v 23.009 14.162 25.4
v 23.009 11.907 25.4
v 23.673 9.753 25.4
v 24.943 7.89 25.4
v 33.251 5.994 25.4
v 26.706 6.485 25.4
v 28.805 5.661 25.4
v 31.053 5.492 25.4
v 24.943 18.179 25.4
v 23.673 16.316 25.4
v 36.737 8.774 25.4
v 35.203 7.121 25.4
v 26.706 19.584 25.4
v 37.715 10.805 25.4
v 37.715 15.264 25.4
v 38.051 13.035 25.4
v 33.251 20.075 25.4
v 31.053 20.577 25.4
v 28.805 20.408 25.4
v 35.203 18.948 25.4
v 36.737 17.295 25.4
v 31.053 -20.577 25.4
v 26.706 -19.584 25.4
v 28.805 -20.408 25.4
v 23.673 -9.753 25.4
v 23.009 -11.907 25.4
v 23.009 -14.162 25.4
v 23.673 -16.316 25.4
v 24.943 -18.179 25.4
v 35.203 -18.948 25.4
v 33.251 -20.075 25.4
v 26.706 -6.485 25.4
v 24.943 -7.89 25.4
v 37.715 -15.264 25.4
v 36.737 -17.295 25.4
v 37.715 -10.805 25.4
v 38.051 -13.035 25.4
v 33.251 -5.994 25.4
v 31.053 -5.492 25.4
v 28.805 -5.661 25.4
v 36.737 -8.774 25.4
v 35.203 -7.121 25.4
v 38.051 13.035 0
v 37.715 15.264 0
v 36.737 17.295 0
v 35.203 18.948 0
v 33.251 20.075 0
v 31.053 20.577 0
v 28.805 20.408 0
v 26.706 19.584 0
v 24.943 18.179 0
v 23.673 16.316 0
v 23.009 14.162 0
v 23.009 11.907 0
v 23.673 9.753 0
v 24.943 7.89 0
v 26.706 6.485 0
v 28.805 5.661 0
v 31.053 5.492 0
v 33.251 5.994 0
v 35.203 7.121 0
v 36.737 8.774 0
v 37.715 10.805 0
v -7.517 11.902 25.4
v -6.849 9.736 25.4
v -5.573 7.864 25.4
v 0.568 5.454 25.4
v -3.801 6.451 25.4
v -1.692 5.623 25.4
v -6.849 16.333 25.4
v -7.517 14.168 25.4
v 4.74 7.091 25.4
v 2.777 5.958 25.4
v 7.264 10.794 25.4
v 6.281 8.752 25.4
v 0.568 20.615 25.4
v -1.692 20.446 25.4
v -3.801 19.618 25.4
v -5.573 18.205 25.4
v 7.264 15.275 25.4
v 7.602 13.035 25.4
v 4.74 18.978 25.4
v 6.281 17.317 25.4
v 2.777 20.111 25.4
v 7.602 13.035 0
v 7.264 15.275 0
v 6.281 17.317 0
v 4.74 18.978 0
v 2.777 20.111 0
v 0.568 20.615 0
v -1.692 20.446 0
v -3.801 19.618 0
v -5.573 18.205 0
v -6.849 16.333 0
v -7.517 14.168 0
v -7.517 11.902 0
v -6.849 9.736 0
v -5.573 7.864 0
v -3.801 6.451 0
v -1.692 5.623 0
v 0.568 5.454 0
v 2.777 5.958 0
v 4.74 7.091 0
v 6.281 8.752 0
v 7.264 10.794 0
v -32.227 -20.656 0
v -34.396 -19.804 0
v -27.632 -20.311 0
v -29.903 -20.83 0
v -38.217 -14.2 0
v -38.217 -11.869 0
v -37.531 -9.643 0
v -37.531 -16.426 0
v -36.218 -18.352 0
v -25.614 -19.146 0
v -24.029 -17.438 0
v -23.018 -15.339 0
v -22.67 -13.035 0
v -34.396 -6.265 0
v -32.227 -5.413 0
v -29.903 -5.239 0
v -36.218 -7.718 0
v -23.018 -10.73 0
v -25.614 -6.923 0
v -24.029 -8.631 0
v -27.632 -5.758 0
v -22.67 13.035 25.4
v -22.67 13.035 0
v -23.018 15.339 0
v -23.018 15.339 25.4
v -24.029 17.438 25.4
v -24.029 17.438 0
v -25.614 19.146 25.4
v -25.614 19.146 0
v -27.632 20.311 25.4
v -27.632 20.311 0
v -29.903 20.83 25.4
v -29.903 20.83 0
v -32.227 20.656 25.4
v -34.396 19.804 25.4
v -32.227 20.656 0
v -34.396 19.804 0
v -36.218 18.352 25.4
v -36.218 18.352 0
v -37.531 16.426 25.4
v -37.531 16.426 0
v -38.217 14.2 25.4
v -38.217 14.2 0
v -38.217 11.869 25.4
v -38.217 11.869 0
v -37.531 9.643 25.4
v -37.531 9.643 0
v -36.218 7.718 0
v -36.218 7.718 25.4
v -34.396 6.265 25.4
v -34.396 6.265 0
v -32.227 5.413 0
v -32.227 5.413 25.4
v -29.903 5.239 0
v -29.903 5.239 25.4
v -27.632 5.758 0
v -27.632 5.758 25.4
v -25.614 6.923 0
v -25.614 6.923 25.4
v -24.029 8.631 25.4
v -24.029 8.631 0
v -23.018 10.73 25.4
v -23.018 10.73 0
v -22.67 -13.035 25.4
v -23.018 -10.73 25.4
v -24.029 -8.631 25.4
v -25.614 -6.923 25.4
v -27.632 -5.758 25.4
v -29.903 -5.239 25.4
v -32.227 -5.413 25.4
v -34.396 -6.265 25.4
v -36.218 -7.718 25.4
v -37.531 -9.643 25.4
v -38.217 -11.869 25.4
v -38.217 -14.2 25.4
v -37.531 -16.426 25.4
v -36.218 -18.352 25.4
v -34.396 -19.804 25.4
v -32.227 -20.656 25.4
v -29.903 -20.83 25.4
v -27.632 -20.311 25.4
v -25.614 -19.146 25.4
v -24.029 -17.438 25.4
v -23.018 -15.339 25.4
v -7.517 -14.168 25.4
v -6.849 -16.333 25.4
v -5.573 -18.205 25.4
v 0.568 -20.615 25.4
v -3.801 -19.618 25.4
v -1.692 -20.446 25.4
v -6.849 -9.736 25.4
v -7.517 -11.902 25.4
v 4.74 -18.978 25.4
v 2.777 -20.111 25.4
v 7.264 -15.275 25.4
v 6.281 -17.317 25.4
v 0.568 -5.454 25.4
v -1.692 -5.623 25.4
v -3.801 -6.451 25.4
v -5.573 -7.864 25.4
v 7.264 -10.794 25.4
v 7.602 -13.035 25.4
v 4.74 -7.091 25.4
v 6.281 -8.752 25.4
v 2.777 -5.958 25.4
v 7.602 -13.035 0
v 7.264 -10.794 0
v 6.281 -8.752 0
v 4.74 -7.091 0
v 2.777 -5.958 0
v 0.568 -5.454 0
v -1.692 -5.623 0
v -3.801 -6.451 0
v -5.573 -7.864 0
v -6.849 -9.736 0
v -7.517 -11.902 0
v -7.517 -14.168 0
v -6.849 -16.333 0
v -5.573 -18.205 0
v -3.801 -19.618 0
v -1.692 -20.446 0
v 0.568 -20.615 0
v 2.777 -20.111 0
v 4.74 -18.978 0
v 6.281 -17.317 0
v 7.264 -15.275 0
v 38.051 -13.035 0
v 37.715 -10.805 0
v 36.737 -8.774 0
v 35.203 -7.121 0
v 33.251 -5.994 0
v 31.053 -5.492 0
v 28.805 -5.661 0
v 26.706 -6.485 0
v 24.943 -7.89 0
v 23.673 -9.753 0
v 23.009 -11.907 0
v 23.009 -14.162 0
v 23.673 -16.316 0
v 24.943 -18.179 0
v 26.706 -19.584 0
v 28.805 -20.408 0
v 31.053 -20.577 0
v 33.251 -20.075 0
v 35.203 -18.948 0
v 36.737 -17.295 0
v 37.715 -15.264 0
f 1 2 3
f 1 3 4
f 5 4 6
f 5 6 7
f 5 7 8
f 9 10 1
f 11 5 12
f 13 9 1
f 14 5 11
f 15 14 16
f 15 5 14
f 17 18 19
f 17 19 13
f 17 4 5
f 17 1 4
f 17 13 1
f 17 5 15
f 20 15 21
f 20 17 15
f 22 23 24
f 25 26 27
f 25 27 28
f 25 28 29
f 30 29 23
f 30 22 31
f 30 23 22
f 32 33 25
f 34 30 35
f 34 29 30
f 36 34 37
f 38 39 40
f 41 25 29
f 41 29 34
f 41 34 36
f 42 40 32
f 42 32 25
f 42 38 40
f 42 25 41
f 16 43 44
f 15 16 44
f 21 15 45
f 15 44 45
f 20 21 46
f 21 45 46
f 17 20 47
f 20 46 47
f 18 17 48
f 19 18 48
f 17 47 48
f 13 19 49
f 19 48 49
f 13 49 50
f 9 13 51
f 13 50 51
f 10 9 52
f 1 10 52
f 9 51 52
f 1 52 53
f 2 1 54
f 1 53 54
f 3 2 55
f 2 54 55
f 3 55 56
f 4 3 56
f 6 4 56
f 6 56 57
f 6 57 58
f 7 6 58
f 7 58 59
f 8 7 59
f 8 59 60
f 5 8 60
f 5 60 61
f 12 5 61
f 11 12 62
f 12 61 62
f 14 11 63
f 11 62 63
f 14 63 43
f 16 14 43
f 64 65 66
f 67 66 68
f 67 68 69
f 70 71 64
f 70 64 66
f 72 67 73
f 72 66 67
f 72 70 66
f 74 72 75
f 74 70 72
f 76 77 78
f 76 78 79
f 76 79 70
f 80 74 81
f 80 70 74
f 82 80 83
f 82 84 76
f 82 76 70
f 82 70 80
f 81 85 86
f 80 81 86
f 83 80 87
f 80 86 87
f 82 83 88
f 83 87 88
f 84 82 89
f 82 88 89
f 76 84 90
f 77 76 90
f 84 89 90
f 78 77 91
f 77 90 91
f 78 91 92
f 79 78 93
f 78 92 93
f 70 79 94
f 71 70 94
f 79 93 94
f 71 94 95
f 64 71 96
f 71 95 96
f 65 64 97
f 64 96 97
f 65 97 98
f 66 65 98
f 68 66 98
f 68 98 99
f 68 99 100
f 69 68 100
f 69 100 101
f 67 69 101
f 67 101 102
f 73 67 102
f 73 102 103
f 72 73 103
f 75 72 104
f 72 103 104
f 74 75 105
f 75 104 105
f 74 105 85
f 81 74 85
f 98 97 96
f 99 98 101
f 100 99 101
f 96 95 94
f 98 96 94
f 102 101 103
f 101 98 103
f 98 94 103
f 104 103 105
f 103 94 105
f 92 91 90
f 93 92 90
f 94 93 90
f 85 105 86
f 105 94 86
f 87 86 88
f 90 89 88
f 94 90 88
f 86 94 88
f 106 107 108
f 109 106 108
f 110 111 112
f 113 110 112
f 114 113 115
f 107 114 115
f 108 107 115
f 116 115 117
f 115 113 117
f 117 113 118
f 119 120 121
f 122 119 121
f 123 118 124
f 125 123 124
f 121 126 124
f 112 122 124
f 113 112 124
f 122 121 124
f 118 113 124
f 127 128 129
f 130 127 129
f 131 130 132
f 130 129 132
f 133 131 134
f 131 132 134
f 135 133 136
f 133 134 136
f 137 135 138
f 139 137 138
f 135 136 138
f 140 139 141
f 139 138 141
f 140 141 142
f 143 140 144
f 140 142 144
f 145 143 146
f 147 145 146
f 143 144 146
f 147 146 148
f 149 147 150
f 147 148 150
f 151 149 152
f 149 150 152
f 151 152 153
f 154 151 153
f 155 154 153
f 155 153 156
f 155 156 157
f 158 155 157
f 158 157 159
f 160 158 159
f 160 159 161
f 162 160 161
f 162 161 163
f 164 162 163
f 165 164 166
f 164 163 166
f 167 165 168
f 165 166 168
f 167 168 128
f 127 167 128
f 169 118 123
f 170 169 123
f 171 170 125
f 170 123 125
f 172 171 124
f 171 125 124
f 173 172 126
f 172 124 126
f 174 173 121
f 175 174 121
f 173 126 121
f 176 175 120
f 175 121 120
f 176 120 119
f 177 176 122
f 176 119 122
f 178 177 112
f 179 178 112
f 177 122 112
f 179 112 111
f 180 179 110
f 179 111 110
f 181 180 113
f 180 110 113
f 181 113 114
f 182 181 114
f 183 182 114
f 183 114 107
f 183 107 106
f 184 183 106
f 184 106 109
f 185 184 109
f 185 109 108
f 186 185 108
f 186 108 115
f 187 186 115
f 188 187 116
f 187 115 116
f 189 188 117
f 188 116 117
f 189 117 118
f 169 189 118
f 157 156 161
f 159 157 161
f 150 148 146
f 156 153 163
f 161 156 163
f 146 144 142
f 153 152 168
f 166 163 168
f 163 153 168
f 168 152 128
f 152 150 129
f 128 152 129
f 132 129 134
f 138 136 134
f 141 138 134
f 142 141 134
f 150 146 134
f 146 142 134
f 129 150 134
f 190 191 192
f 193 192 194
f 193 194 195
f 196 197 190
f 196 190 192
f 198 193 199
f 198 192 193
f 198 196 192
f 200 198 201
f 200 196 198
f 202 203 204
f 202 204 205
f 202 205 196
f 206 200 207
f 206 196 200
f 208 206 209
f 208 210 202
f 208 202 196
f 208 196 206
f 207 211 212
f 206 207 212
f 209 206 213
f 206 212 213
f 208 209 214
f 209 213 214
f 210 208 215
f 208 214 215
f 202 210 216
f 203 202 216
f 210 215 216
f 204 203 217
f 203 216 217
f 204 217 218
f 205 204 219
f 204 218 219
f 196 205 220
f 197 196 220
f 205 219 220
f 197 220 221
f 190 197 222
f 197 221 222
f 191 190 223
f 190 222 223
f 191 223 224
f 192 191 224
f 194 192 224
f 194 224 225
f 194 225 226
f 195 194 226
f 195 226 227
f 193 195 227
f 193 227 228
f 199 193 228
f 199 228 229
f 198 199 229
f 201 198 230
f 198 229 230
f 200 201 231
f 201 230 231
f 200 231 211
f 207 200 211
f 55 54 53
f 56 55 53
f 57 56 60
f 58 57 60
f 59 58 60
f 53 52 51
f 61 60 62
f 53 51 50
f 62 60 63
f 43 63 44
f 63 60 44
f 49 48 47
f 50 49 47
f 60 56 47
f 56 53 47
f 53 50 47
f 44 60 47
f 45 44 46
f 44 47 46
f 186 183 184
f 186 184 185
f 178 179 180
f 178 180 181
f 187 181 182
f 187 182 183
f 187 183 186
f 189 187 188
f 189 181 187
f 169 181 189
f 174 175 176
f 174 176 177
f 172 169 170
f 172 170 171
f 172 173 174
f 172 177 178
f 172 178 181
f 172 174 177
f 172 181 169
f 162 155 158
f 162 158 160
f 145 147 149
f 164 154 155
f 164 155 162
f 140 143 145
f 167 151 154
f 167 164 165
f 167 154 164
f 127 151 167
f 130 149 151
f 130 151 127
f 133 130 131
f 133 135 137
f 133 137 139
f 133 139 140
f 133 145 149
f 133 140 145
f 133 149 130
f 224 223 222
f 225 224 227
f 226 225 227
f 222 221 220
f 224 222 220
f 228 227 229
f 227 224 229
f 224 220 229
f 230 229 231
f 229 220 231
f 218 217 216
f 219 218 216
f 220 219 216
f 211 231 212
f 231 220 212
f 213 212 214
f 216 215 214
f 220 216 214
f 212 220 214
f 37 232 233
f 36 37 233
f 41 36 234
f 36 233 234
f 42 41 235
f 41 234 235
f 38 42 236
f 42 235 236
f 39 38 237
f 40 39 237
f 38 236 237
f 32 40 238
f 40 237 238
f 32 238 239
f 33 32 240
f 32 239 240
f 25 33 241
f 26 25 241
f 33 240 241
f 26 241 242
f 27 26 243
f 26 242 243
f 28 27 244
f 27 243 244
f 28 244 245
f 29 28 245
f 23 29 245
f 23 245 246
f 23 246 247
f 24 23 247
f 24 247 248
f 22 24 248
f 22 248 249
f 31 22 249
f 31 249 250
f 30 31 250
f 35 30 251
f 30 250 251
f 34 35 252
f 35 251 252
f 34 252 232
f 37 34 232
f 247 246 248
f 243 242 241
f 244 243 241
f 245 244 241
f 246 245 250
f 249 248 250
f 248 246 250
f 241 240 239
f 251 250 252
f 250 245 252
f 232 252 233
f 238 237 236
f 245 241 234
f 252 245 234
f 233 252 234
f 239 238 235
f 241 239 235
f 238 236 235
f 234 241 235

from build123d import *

# Parameters (mm, degrees)
F0_R     = 7.563231
F0_R_2   = 7.601846
F0_R_3   = 7.817103
F1_DEPTH = 25.4


with BuildPart() as f1:
    # F0 (on Top) → F1 (new body)
    with BuildSketch(Plane.XY):
        with Locations((30.487562, -13.034533)):
            Circle(F0_R)
        with Locations((0, -13.034533)):
            Circle(F0_R_2)
        with Locations((-30.487549, -13.034533)):
            Circle(F0_R_3)
        with Locations((-30.487549, 13.034533)):
            Circle(F0_R_3)
        with Locations((0, 13.034533)):
            Circle(F0_R_2)
        with Locations((30.487562, 13.034533)):
            Circle(F0_R)
    extrude(amount=F1_DEPTH)


solid = f1.part
